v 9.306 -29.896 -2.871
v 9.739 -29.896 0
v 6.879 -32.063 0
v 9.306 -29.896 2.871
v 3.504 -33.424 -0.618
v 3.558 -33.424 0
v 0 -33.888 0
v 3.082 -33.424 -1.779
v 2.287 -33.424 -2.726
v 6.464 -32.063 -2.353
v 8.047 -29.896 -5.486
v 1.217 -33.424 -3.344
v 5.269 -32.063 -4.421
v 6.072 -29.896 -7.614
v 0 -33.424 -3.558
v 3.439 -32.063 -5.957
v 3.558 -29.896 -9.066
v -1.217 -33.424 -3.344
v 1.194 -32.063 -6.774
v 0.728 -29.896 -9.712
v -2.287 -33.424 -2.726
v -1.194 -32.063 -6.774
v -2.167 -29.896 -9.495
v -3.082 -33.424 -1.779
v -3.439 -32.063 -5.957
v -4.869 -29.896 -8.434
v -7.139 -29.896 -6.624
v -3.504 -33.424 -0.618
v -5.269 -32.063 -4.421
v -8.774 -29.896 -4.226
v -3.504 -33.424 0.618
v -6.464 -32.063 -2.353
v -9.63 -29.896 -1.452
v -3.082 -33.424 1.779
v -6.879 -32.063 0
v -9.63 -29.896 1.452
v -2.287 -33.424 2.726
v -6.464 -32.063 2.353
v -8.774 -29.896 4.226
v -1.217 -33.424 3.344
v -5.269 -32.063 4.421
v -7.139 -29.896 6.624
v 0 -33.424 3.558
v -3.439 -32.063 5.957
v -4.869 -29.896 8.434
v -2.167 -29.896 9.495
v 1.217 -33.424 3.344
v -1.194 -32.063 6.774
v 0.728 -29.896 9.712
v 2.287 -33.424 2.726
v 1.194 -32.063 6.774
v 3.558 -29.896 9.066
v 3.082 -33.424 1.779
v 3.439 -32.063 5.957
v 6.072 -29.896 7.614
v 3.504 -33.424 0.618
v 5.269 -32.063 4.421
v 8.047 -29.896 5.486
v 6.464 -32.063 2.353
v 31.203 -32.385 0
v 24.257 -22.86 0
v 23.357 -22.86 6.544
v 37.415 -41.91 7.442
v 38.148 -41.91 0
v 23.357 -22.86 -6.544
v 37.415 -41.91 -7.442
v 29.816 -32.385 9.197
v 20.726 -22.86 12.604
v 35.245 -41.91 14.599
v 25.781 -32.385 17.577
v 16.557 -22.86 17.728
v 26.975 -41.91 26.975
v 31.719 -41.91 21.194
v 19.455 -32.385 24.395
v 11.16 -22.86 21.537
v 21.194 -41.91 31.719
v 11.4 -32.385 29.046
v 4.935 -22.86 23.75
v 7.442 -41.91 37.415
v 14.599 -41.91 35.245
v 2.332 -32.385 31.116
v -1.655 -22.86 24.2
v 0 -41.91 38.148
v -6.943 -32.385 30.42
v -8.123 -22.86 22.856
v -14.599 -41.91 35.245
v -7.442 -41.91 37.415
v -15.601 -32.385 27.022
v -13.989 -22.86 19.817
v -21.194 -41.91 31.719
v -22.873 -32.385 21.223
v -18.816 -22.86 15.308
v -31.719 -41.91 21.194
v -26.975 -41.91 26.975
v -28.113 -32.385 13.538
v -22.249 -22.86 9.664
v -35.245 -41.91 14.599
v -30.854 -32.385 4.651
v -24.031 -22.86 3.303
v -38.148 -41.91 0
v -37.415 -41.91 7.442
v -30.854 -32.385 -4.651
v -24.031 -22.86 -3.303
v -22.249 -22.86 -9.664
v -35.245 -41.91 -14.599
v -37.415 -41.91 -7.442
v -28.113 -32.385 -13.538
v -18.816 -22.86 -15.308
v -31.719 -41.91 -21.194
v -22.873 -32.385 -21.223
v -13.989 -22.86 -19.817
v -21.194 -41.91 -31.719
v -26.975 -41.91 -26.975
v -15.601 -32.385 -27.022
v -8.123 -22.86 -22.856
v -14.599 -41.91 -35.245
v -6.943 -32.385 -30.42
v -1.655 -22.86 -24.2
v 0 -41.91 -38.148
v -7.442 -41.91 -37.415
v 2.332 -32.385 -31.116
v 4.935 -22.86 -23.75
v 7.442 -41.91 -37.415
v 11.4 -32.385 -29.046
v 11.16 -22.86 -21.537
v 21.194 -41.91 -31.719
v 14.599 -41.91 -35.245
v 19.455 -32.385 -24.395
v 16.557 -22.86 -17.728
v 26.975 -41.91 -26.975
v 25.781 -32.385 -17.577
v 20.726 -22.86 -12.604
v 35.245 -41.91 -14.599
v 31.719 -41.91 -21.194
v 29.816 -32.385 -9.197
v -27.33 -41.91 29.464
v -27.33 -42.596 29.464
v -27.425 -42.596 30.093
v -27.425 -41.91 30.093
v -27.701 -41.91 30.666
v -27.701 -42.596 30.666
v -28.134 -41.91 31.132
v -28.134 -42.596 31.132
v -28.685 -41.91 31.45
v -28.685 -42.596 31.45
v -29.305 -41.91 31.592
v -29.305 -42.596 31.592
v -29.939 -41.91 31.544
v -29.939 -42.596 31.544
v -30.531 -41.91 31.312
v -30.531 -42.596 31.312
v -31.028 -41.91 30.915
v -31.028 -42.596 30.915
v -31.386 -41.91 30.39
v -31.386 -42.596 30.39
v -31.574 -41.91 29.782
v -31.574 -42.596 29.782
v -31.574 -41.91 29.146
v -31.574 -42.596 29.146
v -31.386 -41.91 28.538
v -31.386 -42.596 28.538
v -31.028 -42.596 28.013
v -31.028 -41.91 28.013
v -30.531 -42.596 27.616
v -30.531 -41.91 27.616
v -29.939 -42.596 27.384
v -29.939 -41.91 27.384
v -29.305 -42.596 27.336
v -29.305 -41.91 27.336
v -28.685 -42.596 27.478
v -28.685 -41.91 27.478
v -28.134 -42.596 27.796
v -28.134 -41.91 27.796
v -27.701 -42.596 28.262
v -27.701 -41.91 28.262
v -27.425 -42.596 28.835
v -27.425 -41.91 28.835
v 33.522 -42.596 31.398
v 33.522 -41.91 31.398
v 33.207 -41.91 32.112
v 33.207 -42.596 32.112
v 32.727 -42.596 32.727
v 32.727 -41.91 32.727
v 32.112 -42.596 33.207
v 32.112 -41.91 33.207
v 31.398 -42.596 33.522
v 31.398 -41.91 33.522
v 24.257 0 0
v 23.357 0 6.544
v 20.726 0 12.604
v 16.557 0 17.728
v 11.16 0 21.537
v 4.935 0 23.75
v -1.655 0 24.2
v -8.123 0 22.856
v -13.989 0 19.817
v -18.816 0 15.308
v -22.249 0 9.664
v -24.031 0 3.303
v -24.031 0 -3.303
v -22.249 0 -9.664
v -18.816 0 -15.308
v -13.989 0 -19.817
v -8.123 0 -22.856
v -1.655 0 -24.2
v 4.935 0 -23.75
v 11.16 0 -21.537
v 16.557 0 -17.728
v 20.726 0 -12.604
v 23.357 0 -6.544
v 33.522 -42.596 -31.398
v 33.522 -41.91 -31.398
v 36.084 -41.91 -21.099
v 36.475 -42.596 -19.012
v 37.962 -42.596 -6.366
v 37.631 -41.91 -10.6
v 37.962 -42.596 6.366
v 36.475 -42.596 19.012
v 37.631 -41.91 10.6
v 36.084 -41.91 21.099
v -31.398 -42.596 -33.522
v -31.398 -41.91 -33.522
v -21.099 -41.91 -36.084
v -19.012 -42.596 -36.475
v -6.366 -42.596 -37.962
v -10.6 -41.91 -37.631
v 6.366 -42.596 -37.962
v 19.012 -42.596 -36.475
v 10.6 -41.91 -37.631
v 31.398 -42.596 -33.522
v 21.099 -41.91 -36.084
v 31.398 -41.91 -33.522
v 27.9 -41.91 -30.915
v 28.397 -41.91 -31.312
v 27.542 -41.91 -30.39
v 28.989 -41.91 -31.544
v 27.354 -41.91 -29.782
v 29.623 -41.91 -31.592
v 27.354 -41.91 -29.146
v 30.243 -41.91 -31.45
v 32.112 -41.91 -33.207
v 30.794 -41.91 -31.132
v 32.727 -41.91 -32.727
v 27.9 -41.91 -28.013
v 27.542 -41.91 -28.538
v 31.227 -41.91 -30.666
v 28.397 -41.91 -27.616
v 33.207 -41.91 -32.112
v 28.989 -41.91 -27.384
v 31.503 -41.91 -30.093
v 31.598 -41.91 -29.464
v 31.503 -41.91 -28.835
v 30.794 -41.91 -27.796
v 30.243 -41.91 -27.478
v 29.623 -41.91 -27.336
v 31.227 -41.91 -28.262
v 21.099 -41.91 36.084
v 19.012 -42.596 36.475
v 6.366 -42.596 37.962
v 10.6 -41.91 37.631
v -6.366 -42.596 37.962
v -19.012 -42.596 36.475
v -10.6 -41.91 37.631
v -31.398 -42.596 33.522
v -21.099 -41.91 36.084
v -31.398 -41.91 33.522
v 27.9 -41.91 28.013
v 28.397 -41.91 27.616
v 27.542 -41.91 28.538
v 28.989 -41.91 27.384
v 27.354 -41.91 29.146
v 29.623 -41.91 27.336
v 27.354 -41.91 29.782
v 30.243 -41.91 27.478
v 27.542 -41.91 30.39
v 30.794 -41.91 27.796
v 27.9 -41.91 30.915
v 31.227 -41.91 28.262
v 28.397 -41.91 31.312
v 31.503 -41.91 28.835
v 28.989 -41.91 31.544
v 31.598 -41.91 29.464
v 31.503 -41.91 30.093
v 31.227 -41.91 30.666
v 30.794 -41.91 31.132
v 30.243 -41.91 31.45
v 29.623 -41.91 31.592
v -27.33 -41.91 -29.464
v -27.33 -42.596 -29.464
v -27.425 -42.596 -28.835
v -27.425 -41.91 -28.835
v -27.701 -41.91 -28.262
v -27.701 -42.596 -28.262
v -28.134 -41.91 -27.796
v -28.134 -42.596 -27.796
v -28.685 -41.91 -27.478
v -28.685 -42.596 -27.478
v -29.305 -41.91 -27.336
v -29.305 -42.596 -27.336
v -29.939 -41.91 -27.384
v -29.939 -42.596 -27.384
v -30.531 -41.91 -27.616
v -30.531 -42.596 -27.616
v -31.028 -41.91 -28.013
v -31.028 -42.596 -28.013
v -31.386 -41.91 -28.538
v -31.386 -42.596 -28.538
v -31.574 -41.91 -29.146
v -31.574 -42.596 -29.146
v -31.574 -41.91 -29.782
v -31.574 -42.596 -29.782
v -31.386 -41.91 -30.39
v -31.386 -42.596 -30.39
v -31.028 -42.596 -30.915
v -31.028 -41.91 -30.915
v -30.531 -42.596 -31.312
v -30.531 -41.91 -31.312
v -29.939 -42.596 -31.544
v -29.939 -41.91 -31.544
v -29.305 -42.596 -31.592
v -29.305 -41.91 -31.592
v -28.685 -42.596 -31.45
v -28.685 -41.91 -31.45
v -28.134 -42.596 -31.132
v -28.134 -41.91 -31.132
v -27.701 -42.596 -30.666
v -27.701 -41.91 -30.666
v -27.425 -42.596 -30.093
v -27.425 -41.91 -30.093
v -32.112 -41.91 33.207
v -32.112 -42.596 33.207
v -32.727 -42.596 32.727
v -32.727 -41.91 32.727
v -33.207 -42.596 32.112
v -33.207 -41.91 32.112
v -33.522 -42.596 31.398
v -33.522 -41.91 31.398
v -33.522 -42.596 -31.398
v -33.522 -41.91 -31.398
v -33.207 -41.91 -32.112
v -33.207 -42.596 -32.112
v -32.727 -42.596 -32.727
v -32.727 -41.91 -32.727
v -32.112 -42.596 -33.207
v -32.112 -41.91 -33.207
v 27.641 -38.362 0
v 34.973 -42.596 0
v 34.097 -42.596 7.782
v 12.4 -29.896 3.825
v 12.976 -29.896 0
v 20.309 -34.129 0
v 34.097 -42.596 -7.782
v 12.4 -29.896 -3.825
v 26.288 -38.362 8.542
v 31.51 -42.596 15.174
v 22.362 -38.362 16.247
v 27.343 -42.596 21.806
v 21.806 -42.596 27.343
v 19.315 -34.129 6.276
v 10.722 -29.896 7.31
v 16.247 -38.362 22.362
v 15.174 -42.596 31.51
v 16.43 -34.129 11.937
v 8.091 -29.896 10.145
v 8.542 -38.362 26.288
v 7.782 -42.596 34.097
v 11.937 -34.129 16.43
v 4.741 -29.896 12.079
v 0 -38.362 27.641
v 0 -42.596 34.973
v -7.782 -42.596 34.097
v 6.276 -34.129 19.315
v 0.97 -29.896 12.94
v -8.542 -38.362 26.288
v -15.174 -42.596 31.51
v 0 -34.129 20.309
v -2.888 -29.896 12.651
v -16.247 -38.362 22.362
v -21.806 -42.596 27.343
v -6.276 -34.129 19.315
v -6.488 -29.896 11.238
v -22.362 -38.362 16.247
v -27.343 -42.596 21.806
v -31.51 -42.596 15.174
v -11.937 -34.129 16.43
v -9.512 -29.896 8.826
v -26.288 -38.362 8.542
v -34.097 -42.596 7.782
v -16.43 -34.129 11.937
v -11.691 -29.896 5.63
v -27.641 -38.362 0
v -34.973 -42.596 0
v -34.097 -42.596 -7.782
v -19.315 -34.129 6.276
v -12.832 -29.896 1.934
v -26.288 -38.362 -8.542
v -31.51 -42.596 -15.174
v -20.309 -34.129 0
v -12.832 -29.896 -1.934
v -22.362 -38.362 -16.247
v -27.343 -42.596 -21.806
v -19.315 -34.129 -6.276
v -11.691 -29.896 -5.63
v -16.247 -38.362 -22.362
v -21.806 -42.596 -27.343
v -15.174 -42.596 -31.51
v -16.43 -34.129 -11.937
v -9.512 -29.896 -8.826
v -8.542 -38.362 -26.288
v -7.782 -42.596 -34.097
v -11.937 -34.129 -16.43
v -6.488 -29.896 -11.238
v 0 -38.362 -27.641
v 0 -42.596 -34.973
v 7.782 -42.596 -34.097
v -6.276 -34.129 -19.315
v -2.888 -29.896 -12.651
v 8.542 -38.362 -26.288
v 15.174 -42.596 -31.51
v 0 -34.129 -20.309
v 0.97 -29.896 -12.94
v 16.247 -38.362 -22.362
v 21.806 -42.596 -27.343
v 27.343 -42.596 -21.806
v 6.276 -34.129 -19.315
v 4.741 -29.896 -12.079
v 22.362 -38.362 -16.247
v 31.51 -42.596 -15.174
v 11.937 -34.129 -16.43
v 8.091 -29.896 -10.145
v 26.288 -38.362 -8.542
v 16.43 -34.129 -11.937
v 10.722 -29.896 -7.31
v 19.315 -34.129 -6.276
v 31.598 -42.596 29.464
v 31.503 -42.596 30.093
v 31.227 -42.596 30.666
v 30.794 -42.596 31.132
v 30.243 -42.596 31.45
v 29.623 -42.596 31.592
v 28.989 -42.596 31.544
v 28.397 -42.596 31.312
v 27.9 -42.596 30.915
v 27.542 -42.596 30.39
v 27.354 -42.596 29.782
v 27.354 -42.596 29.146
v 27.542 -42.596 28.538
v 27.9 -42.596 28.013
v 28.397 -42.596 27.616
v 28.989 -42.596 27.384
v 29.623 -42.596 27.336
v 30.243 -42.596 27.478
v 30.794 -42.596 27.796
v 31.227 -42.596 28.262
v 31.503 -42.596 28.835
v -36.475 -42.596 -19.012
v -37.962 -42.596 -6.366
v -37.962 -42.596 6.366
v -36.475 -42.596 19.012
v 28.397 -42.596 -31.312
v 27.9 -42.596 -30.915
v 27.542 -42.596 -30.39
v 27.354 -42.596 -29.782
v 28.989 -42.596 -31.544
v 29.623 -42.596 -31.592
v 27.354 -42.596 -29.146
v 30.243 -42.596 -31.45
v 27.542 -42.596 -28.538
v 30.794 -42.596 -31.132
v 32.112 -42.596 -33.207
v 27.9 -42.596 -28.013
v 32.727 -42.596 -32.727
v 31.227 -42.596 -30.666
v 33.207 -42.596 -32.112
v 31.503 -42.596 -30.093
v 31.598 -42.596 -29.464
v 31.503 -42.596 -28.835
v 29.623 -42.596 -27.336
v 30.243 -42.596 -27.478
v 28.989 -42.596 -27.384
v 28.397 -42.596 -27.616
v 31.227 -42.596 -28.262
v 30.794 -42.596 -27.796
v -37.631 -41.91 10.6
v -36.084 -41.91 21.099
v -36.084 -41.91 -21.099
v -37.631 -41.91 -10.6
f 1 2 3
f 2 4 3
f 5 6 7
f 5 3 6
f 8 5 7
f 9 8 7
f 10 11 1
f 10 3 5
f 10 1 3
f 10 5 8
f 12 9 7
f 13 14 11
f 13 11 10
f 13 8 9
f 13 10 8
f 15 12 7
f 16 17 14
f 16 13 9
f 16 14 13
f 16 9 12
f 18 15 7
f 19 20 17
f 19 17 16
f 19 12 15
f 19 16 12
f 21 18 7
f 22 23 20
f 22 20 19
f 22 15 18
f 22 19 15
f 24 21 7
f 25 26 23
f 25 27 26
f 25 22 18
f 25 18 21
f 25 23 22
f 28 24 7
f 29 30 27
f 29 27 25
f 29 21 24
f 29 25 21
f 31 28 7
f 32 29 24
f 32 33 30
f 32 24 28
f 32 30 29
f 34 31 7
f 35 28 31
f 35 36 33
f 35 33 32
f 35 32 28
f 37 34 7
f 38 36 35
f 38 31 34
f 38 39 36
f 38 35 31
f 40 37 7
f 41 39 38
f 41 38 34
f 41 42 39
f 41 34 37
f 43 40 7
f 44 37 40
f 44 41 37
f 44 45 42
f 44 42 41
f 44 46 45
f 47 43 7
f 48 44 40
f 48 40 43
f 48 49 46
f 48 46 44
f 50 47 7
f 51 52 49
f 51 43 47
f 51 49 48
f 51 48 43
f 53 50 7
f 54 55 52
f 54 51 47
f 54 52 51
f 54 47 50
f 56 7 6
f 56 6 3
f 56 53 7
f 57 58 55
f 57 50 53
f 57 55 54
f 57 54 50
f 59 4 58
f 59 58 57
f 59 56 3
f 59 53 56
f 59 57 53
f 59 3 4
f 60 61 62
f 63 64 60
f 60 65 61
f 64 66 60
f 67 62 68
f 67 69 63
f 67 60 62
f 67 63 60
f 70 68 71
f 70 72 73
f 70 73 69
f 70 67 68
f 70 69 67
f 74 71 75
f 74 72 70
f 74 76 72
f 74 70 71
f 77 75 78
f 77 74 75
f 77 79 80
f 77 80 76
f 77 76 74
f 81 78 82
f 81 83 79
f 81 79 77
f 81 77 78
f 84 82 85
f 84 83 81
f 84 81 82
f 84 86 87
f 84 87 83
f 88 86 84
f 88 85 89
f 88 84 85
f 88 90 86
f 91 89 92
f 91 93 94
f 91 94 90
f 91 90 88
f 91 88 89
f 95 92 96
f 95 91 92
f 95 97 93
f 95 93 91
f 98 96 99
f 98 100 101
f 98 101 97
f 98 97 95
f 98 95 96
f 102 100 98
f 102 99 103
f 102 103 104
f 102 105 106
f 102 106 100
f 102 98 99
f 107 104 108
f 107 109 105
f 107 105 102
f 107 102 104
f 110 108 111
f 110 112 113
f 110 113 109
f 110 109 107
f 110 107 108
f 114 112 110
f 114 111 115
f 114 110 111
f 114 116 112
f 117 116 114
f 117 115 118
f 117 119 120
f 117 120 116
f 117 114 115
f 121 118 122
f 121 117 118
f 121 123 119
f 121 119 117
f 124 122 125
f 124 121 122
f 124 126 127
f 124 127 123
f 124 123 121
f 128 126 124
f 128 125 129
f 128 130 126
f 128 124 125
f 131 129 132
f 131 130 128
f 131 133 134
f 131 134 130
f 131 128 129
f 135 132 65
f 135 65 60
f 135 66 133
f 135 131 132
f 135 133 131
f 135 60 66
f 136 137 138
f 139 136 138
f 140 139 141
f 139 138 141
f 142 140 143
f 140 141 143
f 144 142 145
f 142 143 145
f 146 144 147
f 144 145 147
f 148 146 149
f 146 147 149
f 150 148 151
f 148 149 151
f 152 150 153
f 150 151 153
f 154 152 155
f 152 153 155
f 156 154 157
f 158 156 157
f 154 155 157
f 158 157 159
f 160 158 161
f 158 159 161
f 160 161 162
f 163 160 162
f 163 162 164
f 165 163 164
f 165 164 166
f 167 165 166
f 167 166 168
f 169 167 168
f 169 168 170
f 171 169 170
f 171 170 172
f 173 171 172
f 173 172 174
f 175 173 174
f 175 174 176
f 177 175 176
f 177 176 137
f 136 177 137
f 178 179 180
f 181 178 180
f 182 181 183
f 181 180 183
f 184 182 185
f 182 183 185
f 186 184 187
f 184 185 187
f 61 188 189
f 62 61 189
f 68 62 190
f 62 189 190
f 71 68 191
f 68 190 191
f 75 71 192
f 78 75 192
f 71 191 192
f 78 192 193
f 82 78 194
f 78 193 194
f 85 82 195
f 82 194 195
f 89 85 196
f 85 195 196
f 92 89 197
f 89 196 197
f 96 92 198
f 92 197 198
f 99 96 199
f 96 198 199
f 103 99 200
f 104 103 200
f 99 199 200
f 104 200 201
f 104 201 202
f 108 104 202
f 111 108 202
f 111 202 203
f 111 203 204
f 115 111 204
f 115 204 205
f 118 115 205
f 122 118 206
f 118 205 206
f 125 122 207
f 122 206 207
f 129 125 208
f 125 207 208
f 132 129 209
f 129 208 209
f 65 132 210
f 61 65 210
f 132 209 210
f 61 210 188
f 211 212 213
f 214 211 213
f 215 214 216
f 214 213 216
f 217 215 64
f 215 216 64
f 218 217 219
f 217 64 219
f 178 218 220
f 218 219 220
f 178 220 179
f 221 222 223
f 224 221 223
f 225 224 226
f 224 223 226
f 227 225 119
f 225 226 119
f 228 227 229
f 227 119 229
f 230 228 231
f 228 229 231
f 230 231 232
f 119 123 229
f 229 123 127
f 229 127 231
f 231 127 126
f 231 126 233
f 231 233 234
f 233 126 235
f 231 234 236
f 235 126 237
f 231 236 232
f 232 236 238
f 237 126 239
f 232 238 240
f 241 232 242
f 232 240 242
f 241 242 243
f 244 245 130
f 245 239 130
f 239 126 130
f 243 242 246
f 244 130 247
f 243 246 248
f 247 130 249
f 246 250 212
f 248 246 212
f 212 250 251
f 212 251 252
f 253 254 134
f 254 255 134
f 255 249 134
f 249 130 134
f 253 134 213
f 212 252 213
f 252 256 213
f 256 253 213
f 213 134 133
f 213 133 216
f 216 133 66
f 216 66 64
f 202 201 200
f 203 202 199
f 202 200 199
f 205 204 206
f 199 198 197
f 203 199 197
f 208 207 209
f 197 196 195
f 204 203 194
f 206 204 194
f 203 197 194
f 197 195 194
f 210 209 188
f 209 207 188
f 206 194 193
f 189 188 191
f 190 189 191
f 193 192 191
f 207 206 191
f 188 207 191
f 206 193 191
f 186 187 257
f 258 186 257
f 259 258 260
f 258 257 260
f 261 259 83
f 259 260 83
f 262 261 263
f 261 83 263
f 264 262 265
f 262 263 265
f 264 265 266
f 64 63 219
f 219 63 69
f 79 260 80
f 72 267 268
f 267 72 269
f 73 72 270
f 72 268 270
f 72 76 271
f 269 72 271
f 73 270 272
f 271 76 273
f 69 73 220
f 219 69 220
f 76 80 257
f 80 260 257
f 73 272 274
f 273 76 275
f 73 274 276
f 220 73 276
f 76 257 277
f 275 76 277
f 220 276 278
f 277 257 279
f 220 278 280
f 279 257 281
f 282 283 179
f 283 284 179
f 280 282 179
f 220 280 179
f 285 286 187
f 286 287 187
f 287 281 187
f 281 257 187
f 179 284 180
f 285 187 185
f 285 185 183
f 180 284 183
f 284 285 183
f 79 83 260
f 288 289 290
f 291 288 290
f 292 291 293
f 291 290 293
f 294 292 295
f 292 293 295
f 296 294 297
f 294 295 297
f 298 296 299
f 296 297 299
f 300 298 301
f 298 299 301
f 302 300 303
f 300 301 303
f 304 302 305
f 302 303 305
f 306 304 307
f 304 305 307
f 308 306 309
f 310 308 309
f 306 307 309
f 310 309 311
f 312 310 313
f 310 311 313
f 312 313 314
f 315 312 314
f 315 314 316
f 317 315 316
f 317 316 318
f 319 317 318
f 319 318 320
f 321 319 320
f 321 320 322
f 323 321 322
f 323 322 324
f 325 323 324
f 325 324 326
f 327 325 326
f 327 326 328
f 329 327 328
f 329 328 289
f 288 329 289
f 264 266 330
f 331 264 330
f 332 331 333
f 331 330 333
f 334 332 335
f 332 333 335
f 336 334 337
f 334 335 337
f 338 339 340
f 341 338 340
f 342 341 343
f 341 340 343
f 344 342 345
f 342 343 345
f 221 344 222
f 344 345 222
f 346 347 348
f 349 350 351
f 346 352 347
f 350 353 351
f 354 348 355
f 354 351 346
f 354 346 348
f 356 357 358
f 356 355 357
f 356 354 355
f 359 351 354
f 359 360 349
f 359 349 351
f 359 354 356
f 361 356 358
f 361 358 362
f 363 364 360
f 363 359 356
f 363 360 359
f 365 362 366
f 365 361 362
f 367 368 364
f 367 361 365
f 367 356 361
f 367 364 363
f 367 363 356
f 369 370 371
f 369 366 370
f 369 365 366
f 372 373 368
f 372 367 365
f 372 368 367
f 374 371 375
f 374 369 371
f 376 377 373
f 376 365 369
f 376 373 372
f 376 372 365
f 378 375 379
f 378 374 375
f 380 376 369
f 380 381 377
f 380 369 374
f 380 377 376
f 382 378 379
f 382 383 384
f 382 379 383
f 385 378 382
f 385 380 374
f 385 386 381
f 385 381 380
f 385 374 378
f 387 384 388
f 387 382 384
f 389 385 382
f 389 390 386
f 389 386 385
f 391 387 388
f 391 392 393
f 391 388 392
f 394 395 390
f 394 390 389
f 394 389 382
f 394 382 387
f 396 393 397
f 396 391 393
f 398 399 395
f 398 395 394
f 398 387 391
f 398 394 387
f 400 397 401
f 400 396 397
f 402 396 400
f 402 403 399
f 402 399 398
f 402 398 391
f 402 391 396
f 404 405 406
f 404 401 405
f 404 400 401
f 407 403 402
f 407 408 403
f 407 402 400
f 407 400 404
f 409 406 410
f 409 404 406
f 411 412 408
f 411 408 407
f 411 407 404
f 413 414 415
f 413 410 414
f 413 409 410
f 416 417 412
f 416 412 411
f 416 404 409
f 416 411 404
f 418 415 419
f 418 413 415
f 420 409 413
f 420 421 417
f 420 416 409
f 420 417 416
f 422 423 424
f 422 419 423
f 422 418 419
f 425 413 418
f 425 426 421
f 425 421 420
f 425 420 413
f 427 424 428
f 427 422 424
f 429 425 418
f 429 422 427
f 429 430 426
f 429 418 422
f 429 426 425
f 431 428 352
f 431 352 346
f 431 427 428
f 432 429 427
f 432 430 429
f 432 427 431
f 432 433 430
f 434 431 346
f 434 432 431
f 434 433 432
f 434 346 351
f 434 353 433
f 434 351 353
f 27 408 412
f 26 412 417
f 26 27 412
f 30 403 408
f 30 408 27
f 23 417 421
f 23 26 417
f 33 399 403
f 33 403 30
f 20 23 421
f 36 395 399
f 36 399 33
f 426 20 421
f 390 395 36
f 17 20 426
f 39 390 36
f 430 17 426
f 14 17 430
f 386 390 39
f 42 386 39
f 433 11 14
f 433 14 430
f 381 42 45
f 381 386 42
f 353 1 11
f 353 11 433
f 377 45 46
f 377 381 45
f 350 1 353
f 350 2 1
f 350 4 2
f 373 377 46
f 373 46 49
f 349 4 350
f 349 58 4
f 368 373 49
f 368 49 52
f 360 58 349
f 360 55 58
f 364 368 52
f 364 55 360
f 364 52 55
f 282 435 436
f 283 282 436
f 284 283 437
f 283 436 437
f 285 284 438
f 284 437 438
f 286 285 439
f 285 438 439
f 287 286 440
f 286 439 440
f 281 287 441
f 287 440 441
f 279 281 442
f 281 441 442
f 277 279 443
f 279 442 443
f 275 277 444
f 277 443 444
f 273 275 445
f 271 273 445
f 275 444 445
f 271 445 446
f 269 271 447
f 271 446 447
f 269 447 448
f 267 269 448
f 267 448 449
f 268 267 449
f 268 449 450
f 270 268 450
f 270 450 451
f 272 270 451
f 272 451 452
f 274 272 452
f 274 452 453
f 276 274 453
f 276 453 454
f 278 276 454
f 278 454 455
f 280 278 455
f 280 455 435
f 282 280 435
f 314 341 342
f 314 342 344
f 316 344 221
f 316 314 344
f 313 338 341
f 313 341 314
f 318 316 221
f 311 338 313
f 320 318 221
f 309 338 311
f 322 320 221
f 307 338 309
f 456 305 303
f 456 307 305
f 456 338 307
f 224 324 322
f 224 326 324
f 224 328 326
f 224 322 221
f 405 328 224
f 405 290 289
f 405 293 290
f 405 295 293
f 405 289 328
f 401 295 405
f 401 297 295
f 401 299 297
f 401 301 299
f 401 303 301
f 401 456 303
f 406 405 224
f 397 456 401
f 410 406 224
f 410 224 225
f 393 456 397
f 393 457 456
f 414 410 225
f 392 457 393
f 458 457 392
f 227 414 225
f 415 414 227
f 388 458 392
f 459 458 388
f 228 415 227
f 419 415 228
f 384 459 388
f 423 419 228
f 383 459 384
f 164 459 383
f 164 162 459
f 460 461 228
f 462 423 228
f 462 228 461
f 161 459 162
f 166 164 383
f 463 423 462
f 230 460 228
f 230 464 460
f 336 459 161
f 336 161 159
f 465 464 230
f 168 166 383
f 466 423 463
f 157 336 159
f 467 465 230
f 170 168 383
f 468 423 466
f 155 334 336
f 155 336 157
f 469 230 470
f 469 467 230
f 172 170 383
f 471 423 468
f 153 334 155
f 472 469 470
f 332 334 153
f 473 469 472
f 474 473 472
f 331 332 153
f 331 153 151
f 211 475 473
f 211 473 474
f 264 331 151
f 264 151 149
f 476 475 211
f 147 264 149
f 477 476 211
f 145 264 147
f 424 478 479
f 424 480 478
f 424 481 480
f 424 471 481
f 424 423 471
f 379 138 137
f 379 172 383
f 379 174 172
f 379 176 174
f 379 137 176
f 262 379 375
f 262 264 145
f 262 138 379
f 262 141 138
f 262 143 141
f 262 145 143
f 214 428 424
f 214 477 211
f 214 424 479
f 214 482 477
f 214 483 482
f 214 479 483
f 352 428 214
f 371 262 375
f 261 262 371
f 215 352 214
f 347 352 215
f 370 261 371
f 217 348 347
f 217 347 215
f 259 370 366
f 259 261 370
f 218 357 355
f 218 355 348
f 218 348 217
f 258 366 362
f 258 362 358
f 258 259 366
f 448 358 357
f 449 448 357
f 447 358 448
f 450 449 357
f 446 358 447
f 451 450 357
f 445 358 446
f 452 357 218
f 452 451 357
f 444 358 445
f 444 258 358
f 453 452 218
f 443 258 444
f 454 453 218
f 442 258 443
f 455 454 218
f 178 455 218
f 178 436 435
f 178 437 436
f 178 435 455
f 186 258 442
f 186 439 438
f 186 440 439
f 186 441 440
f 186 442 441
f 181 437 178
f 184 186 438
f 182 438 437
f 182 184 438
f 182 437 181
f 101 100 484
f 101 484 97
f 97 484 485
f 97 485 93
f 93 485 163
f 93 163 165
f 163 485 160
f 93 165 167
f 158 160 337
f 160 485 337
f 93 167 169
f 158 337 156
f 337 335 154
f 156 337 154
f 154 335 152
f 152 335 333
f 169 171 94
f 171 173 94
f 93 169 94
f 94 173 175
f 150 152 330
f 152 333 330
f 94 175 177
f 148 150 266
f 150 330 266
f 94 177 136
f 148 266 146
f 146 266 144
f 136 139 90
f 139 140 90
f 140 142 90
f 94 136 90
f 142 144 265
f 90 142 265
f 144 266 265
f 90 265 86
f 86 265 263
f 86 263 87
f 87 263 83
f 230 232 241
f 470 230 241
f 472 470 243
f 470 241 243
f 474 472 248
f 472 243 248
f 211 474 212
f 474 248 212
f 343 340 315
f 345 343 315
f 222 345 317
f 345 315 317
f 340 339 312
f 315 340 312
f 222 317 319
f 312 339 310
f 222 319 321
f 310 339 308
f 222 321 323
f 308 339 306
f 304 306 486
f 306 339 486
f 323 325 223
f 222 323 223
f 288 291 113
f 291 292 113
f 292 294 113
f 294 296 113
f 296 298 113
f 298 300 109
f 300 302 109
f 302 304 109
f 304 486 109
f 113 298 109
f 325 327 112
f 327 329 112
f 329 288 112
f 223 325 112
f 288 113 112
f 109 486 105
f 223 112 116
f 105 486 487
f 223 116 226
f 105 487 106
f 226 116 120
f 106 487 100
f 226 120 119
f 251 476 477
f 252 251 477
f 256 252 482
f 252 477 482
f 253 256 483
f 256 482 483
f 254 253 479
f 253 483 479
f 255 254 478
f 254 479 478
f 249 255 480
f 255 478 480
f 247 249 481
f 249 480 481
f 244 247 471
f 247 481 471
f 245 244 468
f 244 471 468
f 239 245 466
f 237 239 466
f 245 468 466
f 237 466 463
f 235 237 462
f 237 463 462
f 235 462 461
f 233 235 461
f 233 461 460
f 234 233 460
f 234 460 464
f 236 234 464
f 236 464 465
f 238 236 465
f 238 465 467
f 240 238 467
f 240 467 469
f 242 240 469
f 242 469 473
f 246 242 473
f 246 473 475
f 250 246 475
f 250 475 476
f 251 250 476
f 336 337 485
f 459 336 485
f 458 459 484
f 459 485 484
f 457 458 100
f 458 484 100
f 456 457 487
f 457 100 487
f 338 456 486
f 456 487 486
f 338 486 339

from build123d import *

# Parameters (mm, degrees)
F0_R     = 24.257
F1_DEPTH = 22.86
F2_R     = 24.257
F3_DEPTH = 19.05
F3_TAPER = -36.1
F5_DEPTH = 0.6858
F6_R     = 34.97349893
F7_DEPTH = 12.7
F7_TAPER = 60
F8_R     = 2.1336
F9_DEPTH = 42.5968


with BuildPart() as f1:
    # F0 (on Front) → F1 (new body)
    with BuildSketch(Plane.XZ):
        Circle(F0_R)
    extrude(amount=F1_DEPTH)

    # F2 (on face) → F3 (join)
    with BuildSketch(Plane.XZ.offset(22.86)):
        Circle(F2_R)
    extrude(amount=F3_DEPTH, taper=F3_TAPER)

    # F4 (on face) → F5 (join)
    with BuildSketch(Plane.XZ.offset(41.91)):
        with BuildLine():
            ThreePointArc((33.5223912747, 31.3980251207), (32.7273744523, 32.7273744523), (31.3980251207, 33.5223912747))
            ThreePointArc((31.3980251207, 33.5223912747), (0, 38.14849893), (-31.3980251207, 33.5223912747))
            ThreePointArc((-31.3980251207, 33.5223912747), (-32.7273744523, 32.7273744523), (-33.5223912747, 31.3980251207))
            ThreePointArc((-33.5223912747, 31.3980251207), (-38.14849893, 0), (-33.5223912747, -31.3980251207))
            ThreePointArc((-33.5223912747, -31.3980251207), (-32.7273744523, -32.7273744523), (-31.3980251207, -33.5223912747))
            ThreePointArc((-31.3980251207, -33.5223912747), (0, -38.14849893), (31.3980251207, -33.5223912747))
            ThreePointArc((31.3980251207, -33.5223912747), (32.7273744523, -32.7273744523), (33.5223912747, -31.3980251207))
            ThreePointArc((33.5223912747, -31.3980251207), (38.14849893, 0), (33.5223912747, 31.3980251207))
        make_face()
    extrude(amount=F5_DEPTH)

    # F6 (on face) → F7 (cut)
    with BuildSketch(Plane.XZ.offset(42.5958)):
        Circle(F6_R)
    extrude(amount=-F7_DEPTH, taper=F7_TAPER, mode=Mode.SUBTRACT)

    # F8 (on face) → F9 (cut, through all)
    with BuildSketch(Plane.XZ.offset(42.5958)):
        with Locations((-29.464, 29.464)):
            Circle(F8_R)
        with Locations((29.464, 29.464)):
            Circle(F8_R)
        with Locations((-29.464, -29.464)):
            Circle(F8_R)
        with Locations((29.464, -29.464)):
            Circle(F8_R)
    extrude(amount=-F9_DEPTH, mode=Mode.SUBTRACT)

    # F10 (on Top) → F11 (revolve)
    with BuildSketch(Plane.XY):
        with BuildLine():
            Line((0, -20.0114808977), (0, -33.8875725865))
            ThreePointArc((0, -33.8875725865), (5.9030029242, -32.5693659519), (10.6844540753, -28.8652011141))
            Line((10.6844540753, -28.8652011141), (0, -20.0114808977))
        make_face()
    revolve(axis=Axis((0, -26.9495267421, 0), (0, 1, 0)))


solid = f1.part
